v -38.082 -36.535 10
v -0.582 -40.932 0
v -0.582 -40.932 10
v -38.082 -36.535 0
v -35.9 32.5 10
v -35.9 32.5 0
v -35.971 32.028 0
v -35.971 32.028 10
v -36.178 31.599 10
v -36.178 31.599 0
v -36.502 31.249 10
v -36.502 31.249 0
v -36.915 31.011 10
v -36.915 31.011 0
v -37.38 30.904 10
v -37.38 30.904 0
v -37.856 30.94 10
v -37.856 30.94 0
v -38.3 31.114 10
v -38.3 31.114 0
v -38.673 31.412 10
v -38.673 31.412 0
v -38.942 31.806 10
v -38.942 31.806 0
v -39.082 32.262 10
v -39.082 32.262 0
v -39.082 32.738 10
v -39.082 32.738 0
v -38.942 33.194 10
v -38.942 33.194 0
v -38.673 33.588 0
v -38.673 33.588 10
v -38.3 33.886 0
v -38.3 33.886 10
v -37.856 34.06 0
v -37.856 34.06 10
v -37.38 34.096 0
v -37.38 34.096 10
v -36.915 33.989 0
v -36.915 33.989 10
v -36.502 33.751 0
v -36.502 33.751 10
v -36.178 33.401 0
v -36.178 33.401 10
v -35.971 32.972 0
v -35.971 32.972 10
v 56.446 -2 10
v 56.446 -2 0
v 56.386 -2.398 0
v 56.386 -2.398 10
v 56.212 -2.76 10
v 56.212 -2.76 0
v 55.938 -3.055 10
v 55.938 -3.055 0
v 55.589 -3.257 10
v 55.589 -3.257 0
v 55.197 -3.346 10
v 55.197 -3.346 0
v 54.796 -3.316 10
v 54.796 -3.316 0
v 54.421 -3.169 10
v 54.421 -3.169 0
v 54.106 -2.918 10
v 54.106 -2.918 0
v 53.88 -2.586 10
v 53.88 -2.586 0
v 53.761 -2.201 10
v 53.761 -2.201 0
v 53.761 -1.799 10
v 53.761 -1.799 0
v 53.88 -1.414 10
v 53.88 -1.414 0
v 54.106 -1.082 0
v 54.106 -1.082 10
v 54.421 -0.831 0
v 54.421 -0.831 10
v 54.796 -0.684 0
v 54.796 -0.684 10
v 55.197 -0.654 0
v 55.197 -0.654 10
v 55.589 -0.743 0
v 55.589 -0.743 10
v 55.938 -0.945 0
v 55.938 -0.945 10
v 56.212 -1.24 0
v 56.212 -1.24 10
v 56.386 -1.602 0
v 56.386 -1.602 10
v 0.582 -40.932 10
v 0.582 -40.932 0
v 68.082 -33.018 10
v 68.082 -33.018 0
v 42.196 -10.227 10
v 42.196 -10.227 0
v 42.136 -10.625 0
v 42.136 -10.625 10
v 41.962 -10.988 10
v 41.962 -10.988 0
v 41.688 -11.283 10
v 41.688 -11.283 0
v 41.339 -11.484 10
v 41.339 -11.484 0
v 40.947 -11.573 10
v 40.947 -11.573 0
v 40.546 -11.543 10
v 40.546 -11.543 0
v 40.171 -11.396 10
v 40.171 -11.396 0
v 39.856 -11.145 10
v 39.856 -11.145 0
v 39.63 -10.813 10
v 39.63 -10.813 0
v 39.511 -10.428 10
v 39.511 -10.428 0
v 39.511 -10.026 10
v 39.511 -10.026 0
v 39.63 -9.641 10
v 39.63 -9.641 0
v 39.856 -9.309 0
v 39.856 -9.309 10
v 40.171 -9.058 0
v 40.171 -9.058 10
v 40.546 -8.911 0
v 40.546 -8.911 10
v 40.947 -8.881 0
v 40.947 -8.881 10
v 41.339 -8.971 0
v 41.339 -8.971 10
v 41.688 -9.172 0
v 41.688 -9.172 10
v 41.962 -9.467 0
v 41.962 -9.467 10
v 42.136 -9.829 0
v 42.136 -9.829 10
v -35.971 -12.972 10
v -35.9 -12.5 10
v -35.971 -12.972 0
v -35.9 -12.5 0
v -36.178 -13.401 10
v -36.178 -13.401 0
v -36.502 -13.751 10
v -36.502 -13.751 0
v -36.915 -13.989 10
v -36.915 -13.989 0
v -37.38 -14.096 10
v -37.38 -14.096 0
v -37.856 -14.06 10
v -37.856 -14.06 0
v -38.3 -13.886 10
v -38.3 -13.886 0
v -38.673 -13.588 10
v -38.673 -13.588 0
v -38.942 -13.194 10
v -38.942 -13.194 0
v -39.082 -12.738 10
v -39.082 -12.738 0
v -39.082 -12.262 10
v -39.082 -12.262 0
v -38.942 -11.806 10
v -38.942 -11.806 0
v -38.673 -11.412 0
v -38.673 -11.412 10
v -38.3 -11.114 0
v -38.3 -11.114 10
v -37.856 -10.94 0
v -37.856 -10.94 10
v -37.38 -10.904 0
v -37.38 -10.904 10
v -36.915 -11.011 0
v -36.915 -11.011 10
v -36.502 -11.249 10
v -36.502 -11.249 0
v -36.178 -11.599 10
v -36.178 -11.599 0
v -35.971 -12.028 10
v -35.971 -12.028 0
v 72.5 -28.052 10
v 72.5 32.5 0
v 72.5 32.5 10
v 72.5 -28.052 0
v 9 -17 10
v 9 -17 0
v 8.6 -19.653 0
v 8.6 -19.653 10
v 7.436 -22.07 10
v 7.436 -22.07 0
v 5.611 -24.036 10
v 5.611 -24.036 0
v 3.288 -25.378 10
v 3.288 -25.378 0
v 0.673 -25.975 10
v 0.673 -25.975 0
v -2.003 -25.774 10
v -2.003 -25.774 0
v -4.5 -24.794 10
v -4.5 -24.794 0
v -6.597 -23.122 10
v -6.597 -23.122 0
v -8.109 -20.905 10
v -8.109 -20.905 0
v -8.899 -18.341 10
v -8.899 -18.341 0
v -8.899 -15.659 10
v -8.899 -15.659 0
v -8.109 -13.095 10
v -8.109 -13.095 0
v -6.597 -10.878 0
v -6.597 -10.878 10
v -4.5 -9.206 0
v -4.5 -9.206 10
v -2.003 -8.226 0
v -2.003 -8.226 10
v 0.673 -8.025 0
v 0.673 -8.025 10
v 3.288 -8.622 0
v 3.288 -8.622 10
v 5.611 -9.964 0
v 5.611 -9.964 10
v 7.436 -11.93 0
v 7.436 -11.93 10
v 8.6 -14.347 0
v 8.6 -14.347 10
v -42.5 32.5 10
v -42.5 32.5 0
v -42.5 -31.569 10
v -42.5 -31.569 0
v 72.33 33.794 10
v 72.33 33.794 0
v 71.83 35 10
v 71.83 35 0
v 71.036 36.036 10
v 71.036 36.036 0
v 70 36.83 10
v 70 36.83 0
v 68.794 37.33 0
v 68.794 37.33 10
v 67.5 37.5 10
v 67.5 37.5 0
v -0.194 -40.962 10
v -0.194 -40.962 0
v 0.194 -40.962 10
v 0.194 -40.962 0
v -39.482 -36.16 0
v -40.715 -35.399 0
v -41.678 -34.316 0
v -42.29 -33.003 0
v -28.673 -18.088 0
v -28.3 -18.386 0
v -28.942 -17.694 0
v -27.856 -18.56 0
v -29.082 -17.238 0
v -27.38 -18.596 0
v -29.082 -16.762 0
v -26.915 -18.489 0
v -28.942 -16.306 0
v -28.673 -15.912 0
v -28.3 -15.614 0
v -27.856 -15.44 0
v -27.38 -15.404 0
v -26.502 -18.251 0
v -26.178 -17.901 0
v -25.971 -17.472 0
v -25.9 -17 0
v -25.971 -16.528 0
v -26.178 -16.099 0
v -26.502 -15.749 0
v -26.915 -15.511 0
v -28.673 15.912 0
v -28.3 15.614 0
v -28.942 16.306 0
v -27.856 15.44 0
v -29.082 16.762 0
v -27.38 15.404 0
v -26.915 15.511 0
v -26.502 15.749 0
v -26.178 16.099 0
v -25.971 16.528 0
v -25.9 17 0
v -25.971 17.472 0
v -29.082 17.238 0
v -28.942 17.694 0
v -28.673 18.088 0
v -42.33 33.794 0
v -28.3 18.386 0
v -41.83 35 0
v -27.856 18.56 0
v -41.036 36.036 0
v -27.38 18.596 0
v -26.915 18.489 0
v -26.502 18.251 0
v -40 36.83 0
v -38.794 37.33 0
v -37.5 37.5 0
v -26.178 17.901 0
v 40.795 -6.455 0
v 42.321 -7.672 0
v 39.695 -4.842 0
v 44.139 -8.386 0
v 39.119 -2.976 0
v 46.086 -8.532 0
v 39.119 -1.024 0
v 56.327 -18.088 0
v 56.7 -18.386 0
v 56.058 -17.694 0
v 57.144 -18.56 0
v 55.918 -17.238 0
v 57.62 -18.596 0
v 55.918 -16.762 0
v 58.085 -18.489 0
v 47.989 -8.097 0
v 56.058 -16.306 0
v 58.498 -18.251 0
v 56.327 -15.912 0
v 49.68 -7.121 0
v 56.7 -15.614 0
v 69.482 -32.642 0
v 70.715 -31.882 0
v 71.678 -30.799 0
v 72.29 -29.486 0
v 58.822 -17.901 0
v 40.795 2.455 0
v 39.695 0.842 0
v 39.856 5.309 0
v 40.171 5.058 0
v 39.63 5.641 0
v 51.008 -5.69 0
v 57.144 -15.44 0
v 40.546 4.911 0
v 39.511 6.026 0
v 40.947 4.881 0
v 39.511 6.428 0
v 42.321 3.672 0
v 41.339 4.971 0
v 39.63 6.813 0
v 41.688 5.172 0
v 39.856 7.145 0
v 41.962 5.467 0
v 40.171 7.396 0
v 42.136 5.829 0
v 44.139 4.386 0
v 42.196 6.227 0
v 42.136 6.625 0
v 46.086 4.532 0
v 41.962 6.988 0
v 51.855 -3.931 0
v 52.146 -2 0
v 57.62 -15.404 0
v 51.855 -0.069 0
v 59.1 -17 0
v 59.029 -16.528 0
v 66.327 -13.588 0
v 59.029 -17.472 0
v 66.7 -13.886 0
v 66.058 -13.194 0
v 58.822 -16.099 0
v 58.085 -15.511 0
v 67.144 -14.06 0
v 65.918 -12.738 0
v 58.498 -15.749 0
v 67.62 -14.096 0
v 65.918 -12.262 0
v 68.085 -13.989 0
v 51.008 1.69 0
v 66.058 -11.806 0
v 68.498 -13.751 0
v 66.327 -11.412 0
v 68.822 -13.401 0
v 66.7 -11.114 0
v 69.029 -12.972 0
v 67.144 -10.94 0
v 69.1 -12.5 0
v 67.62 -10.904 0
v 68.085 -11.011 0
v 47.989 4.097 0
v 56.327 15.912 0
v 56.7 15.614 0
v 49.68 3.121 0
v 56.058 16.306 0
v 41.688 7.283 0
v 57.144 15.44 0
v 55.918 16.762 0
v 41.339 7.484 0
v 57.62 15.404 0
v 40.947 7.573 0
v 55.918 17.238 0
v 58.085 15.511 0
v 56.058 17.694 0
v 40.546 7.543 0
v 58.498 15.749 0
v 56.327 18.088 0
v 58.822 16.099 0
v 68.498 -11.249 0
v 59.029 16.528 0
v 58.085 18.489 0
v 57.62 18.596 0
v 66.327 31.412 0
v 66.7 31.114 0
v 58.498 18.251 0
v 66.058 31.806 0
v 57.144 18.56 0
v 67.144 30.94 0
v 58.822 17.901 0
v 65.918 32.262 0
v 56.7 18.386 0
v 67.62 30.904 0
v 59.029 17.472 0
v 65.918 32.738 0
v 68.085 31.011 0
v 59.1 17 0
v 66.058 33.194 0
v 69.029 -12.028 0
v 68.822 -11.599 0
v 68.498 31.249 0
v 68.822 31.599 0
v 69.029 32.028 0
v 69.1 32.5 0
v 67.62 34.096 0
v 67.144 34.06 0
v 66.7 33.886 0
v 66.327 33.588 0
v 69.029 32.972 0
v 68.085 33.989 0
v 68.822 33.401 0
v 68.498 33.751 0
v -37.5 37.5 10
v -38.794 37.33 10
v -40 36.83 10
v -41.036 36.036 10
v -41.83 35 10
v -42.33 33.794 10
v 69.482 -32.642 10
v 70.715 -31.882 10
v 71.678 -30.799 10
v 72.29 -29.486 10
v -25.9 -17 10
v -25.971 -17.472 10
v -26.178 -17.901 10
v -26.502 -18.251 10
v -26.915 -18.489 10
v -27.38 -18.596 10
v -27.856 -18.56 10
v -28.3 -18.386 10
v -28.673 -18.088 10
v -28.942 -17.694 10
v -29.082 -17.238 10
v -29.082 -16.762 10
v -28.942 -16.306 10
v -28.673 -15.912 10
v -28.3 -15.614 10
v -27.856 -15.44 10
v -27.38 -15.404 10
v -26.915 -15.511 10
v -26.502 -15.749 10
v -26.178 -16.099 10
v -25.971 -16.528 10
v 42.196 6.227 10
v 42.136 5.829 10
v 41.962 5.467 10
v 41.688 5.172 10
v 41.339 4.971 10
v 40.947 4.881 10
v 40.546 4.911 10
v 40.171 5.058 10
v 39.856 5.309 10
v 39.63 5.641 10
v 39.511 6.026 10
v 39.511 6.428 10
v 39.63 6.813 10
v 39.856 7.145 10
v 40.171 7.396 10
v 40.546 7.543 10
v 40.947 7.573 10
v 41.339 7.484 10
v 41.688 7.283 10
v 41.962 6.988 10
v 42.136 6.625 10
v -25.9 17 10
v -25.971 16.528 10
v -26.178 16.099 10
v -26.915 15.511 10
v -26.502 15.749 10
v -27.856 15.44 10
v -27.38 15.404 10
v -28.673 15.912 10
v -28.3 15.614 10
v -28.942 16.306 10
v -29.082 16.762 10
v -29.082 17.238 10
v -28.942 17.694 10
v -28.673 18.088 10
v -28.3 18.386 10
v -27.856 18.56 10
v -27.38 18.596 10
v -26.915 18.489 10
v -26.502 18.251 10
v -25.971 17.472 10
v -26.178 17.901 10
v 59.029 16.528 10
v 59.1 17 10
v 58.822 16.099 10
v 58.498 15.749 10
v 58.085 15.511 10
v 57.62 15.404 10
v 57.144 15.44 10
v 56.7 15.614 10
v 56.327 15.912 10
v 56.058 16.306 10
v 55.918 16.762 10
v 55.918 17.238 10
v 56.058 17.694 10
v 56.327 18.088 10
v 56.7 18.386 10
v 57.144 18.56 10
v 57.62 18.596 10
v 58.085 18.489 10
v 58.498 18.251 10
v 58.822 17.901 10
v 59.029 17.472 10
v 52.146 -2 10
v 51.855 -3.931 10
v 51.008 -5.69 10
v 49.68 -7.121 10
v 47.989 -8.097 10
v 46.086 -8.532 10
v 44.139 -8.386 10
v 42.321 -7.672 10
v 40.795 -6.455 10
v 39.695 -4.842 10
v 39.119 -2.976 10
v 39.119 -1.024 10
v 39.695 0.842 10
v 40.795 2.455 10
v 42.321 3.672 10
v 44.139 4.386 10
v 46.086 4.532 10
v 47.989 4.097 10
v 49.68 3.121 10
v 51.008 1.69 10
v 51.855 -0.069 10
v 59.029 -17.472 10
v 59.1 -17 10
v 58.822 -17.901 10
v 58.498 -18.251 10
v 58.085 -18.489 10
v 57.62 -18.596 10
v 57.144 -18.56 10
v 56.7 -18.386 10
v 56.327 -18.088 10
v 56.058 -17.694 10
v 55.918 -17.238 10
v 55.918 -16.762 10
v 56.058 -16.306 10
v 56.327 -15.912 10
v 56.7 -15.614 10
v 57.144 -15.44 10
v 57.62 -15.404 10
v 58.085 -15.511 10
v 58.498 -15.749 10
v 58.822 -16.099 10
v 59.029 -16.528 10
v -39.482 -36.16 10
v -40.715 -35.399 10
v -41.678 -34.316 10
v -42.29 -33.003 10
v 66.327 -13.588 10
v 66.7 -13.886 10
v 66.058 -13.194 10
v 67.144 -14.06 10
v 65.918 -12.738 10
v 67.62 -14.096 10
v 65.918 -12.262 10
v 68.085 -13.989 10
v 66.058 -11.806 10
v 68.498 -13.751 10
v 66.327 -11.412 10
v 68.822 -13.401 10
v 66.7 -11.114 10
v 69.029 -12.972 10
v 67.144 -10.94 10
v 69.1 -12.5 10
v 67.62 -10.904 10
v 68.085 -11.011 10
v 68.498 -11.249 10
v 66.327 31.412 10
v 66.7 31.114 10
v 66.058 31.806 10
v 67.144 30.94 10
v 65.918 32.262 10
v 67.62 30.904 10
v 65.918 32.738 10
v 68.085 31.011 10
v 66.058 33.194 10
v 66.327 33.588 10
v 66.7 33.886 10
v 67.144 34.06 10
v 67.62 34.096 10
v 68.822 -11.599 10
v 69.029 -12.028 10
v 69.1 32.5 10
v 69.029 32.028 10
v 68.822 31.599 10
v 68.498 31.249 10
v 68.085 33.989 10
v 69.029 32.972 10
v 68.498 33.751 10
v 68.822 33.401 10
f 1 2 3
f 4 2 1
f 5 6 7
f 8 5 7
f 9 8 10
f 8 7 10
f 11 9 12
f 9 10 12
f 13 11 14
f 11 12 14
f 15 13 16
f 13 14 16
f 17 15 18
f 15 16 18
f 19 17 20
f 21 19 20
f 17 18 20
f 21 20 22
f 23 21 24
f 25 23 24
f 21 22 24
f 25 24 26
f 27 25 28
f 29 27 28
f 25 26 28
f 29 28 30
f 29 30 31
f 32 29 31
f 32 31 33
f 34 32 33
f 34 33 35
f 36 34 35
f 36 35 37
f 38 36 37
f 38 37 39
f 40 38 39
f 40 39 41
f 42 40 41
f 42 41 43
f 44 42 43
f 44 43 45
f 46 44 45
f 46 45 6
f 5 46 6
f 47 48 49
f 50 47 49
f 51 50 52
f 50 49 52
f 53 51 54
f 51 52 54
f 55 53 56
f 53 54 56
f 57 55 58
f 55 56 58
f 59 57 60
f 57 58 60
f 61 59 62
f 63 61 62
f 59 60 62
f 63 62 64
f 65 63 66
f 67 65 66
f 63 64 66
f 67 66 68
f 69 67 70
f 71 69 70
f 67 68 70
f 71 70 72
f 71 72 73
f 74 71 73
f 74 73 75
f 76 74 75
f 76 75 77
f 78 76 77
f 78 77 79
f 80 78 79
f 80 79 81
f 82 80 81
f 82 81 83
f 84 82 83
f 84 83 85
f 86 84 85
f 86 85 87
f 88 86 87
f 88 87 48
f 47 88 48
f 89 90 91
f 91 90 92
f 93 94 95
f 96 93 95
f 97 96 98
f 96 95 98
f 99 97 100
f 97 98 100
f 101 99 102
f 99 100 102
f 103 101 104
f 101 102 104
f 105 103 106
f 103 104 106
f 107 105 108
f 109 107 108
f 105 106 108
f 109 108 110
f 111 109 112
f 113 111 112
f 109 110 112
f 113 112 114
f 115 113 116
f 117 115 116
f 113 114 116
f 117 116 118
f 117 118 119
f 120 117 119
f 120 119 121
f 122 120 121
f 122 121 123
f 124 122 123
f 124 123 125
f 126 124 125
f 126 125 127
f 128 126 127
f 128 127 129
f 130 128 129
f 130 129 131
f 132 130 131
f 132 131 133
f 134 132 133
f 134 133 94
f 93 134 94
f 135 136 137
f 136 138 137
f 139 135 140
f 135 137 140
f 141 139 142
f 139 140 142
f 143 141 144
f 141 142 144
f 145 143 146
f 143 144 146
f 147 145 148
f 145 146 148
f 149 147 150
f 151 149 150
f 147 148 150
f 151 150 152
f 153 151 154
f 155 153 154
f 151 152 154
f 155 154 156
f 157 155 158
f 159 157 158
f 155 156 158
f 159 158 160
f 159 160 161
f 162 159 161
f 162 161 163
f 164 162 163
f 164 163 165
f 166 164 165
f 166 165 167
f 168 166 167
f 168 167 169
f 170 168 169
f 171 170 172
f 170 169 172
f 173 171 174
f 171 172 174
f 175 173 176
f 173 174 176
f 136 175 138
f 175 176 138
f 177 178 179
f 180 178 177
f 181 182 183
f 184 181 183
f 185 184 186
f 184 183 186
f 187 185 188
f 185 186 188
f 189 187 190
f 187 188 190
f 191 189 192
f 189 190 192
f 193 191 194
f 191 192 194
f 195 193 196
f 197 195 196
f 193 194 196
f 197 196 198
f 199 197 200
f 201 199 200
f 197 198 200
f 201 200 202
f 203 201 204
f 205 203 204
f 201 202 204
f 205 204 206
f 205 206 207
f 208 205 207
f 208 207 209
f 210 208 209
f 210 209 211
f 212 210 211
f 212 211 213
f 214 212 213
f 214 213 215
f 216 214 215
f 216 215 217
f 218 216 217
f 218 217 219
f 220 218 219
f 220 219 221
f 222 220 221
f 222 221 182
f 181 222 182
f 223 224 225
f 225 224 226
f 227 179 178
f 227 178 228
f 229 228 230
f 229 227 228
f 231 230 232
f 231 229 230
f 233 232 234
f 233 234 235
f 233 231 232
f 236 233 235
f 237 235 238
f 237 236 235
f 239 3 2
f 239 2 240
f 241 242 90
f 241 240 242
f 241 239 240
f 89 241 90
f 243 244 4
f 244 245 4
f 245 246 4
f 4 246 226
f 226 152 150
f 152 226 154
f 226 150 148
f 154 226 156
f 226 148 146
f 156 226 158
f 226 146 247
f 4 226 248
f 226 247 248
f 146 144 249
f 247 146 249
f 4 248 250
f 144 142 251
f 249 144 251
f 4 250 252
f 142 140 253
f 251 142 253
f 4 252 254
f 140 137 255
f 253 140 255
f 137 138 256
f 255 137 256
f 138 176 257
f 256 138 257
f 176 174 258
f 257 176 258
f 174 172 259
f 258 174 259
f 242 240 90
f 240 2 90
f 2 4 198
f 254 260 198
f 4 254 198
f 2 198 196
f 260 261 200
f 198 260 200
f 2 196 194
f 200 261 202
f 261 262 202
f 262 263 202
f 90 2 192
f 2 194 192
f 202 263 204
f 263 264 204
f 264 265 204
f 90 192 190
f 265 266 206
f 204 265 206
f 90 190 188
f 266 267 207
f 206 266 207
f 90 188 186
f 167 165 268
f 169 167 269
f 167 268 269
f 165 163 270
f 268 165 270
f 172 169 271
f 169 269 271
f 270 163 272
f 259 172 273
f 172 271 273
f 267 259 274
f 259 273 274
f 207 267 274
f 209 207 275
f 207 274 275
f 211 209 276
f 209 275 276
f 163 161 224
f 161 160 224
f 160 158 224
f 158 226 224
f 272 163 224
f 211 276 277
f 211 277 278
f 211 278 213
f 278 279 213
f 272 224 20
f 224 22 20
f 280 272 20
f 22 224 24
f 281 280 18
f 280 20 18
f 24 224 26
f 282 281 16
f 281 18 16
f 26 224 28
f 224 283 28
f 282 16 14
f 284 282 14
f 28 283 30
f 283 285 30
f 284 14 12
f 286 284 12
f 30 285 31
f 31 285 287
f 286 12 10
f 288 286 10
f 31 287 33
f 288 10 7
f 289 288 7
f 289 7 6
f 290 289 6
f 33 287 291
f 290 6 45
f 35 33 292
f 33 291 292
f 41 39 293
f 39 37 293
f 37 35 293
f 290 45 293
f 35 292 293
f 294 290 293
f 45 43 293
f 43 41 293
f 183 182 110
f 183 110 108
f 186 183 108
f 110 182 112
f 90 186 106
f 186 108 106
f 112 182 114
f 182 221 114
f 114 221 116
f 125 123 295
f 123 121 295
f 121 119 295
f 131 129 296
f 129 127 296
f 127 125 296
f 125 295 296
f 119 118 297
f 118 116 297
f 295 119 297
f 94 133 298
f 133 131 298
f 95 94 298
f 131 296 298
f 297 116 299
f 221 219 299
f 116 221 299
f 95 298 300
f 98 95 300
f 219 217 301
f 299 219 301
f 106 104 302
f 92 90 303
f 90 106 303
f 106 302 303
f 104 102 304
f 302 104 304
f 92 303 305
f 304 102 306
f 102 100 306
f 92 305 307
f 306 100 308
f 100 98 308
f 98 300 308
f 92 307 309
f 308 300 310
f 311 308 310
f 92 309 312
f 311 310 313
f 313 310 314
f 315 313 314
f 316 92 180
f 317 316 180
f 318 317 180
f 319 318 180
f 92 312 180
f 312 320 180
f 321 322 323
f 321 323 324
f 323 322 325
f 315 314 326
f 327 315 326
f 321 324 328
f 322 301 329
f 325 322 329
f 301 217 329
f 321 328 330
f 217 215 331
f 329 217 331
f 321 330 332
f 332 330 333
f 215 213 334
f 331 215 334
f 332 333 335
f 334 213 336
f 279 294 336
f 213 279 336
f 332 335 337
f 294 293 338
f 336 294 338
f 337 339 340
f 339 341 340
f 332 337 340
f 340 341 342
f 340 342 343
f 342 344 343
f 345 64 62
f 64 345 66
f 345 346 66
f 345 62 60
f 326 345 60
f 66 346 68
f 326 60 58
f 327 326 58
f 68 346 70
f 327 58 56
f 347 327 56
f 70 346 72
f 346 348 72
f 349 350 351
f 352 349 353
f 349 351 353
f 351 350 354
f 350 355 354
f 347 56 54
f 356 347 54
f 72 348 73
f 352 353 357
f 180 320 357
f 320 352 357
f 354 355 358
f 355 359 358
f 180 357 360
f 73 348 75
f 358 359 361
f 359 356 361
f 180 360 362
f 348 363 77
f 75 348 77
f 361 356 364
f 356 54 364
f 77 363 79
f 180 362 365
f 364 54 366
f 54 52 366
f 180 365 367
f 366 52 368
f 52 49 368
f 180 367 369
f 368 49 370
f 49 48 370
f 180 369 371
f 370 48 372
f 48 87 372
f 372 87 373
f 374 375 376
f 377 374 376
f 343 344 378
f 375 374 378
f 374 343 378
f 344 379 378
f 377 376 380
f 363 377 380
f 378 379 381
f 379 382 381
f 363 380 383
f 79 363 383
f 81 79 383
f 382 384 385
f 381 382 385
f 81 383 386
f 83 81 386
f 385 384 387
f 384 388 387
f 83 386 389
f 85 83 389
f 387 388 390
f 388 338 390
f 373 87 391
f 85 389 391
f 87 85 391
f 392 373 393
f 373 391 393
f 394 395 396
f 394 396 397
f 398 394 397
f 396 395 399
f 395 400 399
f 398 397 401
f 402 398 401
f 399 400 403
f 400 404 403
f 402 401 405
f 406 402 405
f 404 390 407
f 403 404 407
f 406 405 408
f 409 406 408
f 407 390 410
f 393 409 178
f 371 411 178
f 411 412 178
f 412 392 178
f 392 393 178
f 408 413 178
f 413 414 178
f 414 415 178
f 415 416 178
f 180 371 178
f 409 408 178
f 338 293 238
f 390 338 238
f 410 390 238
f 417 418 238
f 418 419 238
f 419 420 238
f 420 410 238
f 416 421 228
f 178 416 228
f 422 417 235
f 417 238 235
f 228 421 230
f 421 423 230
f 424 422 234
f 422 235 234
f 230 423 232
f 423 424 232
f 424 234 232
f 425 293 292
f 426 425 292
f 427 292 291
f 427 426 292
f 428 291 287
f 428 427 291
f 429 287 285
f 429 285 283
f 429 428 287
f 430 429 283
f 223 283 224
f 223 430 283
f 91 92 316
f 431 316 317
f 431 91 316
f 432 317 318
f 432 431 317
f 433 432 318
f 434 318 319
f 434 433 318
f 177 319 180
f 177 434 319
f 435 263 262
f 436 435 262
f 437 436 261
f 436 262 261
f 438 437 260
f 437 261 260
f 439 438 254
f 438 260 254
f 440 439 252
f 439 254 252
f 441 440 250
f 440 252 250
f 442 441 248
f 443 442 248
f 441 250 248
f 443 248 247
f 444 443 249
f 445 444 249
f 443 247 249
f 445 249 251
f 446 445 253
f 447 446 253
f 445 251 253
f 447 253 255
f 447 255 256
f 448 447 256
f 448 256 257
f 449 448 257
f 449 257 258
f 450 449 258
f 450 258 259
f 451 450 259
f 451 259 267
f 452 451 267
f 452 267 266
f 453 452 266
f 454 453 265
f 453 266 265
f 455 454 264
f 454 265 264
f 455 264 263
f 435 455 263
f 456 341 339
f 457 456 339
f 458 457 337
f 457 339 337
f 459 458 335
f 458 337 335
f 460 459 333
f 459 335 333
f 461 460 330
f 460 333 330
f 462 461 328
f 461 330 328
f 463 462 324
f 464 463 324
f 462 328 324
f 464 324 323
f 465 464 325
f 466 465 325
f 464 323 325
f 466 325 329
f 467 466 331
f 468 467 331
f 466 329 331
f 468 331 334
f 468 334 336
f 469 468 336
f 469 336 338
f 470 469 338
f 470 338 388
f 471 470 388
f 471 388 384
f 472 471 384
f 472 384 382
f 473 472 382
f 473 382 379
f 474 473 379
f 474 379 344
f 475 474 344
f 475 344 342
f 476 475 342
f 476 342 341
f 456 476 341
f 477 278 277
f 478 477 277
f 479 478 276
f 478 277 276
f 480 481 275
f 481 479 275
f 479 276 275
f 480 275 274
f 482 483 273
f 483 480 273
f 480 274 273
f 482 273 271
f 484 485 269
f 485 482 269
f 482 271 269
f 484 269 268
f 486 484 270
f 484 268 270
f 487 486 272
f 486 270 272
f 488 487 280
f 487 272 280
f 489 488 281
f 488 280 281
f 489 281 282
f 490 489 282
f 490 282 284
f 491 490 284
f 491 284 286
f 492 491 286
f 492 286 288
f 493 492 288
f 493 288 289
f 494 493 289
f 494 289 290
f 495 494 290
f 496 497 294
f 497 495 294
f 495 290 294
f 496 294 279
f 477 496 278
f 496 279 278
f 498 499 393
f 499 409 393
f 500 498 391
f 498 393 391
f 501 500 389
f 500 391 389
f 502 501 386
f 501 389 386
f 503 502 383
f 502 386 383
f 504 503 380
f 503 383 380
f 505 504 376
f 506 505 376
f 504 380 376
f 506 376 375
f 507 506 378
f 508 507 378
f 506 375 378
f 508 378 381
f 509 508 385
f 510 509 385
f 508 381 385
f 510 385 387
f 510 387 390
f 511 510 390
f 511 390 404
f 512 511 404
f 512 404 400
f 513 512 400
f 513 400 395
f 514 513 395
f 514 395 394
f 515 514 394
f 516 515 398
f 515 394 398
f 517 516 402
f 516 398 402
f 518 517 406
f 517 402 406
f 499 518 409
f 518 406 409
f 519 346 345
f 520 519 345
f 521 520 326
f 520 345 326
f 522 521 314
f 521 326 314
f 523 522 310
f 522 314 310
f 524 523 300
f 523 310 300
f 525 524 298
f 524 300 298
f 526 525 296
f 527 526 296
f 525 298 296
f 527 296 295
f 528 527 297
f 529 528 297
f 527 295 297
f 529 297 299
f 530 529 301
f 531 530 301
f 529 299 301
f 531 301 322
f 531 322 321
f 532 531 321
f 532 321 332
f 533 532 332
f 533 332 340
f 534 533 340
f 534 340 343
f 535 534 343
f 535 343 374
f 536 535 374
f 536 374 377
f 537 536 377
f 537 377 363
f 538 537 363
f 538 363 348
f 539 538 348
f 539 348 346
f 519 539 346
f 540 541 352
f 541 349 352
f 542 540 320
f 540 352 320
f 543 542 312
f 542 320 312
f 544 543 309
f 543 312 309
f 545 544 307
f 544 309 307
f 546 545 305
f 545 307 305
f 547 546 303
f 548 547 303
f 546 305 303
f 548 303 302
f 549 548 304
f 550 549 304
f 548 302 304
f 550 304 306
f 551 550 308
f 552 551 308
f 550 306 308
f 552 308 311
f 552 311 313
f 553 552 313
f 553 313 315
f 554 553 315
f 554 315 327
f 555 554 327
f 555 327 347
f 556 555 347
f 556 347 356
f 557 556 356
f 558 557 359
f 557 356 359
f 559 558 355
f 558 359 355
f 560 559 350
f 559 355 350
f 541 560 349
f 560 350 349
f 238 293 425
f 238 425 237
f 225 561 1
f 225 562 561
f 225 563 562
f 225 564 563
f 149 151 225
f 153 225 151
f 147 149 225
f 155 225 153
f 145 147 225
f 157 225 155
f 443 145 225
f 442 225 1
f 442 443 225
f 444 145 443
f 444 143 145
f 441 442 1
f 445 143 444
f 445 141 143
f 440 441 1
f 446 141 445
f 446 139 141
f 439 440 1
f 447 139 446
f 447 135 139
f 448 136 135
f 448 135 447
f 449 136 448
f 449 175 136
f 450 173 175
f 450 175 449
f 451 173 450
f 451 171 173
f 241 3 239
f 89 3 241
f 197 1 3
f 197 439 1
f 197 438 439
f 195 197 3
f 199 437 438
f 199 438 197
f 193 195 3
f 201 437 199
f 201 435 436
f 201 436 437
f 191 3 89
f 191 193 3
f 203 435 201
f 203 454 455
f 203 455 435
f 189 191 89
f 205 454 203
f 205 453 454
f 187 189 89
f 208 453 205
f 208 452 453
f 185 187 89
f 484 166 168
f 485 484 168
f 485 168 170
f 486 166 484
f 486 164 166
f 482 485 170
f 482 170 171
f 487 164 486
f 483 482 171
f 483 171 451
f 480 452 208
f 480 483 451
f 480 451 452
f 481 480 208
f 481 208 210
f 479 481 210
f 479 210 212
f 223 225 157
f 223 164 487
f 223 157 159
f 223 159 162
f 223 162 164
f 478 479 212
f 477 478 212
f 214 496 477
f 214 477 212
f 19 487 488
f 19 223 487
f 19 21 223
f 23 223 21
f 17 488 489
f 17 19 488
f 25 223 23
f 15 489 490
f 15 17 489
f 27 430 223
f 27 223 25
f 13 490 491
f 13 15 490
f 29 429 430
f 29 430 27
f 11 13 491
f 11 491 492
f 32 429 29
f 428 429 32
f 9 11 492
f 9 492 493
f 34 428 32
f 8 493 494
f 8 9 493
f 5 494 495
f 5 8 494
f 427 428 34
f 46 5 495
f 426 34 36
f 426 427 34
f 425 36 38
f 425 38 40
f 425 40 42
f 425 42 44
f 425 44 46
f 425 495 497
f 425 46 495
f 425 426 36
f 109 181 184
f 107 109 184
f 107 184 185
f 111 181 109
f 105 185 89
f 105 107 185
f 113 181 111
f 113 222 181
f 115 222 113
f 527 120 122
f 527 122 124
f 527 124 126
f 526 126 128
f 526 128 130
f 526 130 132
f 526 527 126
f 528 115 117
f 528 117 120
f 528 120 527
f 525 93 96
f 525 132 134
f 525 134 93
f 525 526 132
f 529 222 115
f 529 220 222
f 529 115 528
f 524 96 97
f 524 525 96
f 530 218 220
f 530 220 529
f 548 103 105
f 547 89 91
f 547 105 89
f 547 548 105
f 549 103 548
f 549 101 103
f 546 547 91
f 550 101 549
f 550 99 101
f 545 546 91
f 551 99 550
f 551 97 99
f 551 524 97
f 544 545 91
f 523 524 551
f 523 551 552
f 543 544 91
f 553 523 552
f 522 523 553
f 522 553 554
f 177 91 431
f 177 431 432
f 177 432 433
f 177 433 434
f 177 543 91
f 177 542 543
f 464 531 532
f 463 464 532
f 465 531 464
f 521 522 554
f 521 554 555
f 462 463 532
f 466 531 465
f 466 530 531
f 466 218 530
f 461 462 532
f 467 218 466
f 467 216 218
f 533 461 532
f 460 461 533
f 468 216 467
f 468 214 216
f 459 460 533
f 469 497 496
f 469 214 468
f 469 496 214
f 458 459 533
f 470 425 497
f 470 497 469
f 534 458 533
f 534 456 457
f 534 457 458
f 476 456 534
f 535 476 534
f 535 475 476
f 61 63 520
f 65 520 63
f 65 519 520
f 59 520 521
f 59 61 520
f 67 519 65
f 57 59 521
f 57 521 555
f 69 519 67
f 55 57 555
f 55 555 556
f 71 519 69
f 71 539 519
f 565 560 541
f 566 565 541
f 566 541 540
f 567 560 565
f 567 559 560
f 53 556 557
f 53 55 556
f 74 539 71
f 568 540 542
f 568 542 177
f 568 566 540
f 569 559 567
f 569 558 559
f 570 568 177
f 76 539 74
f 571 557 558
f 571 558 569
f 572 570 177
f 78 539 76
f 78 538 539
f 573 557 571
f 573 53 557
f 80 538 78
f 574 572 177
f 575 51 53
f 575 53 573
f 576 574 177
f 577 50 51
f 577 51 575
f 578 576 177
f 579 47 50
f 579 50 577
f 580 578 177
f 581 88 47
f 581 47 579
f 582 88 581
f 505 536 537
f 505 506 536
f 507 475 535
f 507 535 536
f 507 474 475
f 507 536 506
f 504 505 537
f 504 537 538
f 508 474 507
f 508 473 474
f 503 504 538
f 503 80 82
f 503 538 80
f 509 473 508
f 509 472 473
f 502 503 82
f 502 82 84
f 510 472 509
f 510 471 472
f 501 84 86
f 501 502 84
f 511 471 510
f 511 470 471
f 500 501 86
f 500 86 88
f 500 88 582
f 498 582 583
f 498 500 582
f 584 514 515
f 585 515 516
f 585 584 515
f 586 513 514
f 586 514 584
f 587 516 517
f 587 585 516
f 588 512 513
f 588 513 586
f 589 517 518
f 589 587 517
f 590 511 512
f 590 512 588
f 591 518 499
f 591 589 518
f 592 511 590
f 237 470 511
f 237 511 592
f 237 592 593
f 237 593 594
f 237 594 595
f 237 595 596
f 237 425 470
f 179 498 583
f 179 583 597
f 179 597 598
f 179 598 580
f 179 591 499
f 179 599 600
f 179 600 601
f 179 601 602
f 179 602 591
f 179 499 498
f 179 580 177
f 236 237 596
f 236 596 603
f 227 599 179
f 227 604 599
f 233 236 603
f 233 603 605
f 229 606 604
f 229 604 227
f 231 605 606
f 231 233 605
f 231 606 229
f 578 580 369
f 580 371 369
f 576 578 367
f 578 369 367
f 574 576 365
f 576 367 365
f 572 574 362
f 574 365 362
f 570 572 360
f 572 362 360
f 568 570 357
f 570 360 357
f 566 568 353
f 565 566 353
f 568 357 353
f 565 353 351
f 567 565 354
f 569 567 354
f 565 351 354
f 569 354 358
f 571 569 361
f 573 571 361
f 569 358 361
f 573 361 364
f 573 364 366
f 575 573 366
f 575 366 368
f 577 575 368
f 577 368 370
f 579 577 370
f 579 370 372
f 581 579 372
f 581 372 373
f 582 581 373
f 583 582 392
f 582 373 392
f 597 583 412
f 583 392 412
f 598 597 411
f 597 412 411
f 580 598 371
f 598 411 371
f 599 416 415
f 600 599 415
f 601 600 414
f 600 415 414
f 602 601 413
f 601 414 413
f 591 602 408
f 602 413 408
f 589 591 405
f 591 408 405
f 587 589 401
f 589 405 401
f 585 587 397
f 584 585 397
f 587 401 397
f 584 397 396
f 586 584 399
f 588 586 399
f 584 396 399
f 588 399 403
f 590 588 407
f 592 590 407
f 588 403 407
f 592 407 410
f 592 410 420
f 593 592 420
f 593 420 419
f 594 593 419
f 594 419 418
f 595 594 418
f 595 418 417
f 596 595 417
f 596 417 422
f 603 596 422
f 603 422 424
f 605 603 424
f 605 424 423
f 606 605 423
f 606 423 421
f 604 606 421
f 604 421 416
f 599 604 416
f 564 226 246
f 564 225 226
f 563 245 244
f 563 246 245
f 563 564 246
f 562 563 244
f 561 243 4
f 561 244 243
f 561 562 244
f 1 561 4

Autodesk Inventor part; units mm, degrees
ref_plane "YZ Plane" through (0, 0, 0) normal (1, 0, 0) x (0, 1, 0)
ref_plane "XZ Plane" through (0, 0, 0) normal (0, 1, 0) x (-1, 0, 0)
ref_plane "XY Plane" through (0, 0, 0) normal (0, 0, 1) x (1, 0, 0)
sketch "スケッチ1" plane through (0, 0, 0) normal (0, 0, 1) x (1, 0, 0)
  point P0 (0, 0)
sketch "スケッチ2" plane through (0, 0, 0) normal (0, 0, 1) x (1, 0, 0)
  line L0 (72.5, -37.5) -> (-72.5, -37.5)
  line L1 (-72.5, -37.5) -> (-72.5, 37.5)
  line L2 (-72.5, 37.5) -> (72.5, 37.5)
  line L3 (72.5, 37.5) -> (72.5, -37.5)
  line L4 (72.5, -37.5) -> (-72.5, 37.5) construction
  line L5 (-72.5, -37.5) -> (72.5, 37.5) construction
  circle A0 centre (-48, -17) radius 6.05
  circle A1 centre (-48, -17) radius 9
  circle A2 centre (-57, -17) radius 1.6
  circle A3 centre (-48, -26) radius 1.6
  circle A4 centre (-39, -17) radius 1.6
  circle A5 centre (-48, -8) radius 1.6
  line L6 (67.5, 32.5) -> (-67.5, 32.5)
  line L7 (-67.5, 32.5) -> (-67.5, -32.5)
  line L8 (-67.5, -32.5) -> (67.5, -32.5)
  line L9 (67.5, -32.5) -> (67.5, 32.5)
  line L10 (-67.5, 32.5) -> (-67.5, 12.5) construction
  line L11 (-69.1, 32.5) -> (-69.1, 12.5)
  line L12 (-65.9, 12.5) -> (-65.9, 32.5)
  arc A6 (-65.9, 32.5) -> (-69.1, 32.5) centre (-67.5, 32.5) ccw
  arc A7 (-69.1, 12.5) -> (-65.9, 12.5) centre (-67.5, 12.5) ccw
  line L13 (-67.5, 32.5) -> (-47.5, 32.5) construction
  line L14 (-67.5, -32.5) -> (-67.5, -12.5) construction
  line L15 (-65.9, -32.5) -> (-65.9, -12.5)
  line L16 (-69.1, -12.5) -> (-69.1, -32.5)
  arc A8 (-69.1, -32.5) -> (-65.9, -32.5) centre (-67.5, -32.5) ccw
  arc A9 (-65.9, -12.5) -> (-69.1, -12.5) centre (-67.5, -12.5) ccw
  line L17 (-67.5, -32.5) -> (-47.5, -32.5) construction
  line L18 (67.5, 32.5) -> (105, 32.5) construction
  line L19 (-72.5, -17) -> (72.5, -17)
  circle A10 centre (0, -17) radius 9
  circle A11 centre (0, -17) radius 39
  line L20 (-65, 37.5) -> (65, 37.5)
  line L21 (65, 37.5) -> (65, 32.5)
  line L22 (65, 32.5) -> (-65, 32.5)
  line L23 (-65, 32.5) -> (-65, 37.5)
  line L24 (-65, 32.5) -> (0, 0)
  line L25 (0, 0) -> (65, 32.5)
  line L26 (-72.5, 0) -> (72.5, 0)
  line L27 (72.5, 0) -> (72.5, -47.5)
  line L28 (72.5, -47.5) -> (-72.5, -47.5)
  line L29 (-72.5, -47.5) -> (-72.5, 0)
  circle A12 centre (-67.5, 32.5) radius 1.6
  circle A13 centre (-67.5, -12.5) radius 1.6
  line L30 (0, 37.5) -> (0, -47.5)
  line L31 (67.5, 32.5) -> (67.5, 12.5) construction
  line L32 (69.1, 32.5) -> (69.1, 12.5)
  line L33 (65.9, 12.5) -> (65.9, 32.5)
  arc A14 (69.1, 32.5) -> (65.9, 32.5) centre (67.5, 32.5) ccw
  arc A15 (65.9, 12.5) -> (69.1, 12.5) centre (67.5, 12.5) ccw
  line L34 (67.5, -32.5) -> (67.5, -12.5) construction
  line L35 (65.9, -32.5) -> (65.9, -12.5)
  line L36 (69.1, -12.5) -> (69.1, -32.5)
  arc A16 (65.9, -32.5) -> (69.1, -32.5) centre (67.5, -32.5) ccw
  arc A17 (69.1, -12.5) -> (65.9, -12.5) centre (67.5, -12.5) ccw
  circle A18 centre (67.5, 32.5) radius 1.6
  circle A19 centre (67.5, -12.5) radius 1.6
  circle A20 centre (-57.5, -17) radius 1.6
  circle A21 centre (-57.5, 17) radius 1.6
  circle A22 centre (57.5, -17) radius 1.6
  circle A23 centre (57.5, 17) radius 1.6
  circle A24 centre (45.5961, -2) radius 6.55
  circle A25 centre (45.5961, -2) radius 9.5
  circle A26 centre (55.0961, -2) radius 1.35
  circle A27 centre (40.8461, 6.2272) radius 1.35
  circle A28 centre (40.8461, -10.2272) radius 1.35
  circle A29 centre (45.5961, -2) radius 24
  circle A30 centre (0, -17) radius 24
  line L37 (69.5961, -2) -> (21.5961, -2)
  line L38 (0, -41) -> (-72.5, -32.5)
  line L39 (0, -41) -> (72.5, -32.5)
  circle A31 centre (-37.5, -12.5) radius 1.6
  circle A32 centre (-27.5, -17) radius 1.6
  circle A33 centre (-37.5, 32.5) radius 1.6
  circle A34 centre (-27.5, 17) radius 1.6
  line L40 (-42.5, 37.5) -> (-42.5, -47.5)
  circle A35 centre (45.5961, -2) radius 12.2
  point P0 (-67.5, 22.5)
  point P1 (-67.5, -22.5)
  point P2 (-39.1422, -18.5937)
  point P3 (-39.1422, -15.4063)
  point P4 (65, 37.5)
  point P5 (67.5, 22.5)
  point P6 (67.5, -22.5)
  point P7 (-65.9, -12.5)
  point P8 (-69.1, 32.5)
  point P9 (-65, 32.5)
  point P10 (36, -2)
  point P11 (38.741, -15.0124)
  point P12 (33.8387, -0.1107)
  point P13 (63.5912, 34.2414)
  point P14 (65, 36.6)
  point P15 (-65, 36.6)
  point P16 (-63.5912, 34.2414)
  point P17 (-5.5513, -40.3492)
  point P18 (5.5513, -40.3492)
  point P19 (72.5, -32.5)
  point P20 (25.3223, 12.6611)
  point P21 (-25.3223, 12.6611)
  point P22 (-72.5, -32.5)
  point P23 (-42.5, 37.5)
  point P24 (-42.5, -36.0172)
  dimension "d15" = 18
  dimension "d56" = 19
  dimension "d60" = 48
  dimension "d0" = 145
  dimension "d1" = 75
  dimension "d5" = 12.1
  dimension "d16" = 3.2
  dimension "d19" = 360
  dimension "d21" = 5
  dimension "d22" = 20
  dimension "d23" = 90
  dimension "d24" = 3.2
  dimension "d25" = 20
  dimension "d26" = 90
  dimension "d27" = 3.2
  dimension "d36" = 20.5
  dimension "d37" = 18
  dimension "d38" = 78
  dimension "d40" = 48
  dimension "d43" = 130
  dimension "d44" = 65
  dimension "d46" = 47.5
  dimension "d47" = 3.2
  dimension "d48" = 3.2
  dimension "d49" = 10
  dimension "d50" = 10
  dimension "d51" = 17
  dimension "d52" = 17
  dimension "d55" = 13.1
  dimension "d57" = 2.7
  dimension "d58" = 360
  dimension "d59" = 48
  dimension "d62" = 15
  dimension "d65" = 30
  dimension "d70" = 30
  dimension "d71" = 24.4
extrude "押し出し1" add sketch "スケッチ2" along normal blind 10 contours L39 A16 L36 L19 L3 | L39 A30 L0 | L0 A30 L8 A11 L39 | A11 L8 A16 L39 | L19 L36 A17 A29 L26 L3 | L39 A16 L8 L9 L19 L36 | A30 L39 L30 L0 | L0 L30 L8 A30 | A11 A29 L19 L35 L8 | L8 A30 L19 A29 A11 | L26 A29 L9 A15 L32 A14 L6 L21 L2 L3 | L19 L9 A19 L36 | L30 L38 A30 L0 | L0 A30 L8 L30 | L8 L30 A10 L19 A30 | L35 L19 L9 L8 | A29 L19 A11 | A11 L19 A22 A29 | A29 L37 L9 L26 | L26 L9 A29 | L19 L35 A29 A19 L9 | A30 L38 L0 | L0 L38 A11 L8 A30 | L8 A30 L19 A10 L30 | A30 A29 L19 | L19 A10 L30 L26 A30 | L38 L40 L8 A11 | L19 A29 L35 | A11 A35 L37 L9 A17 L35 A29 L19 A22 | L19 A29 L37 A35 A11 | L21 L6 L30 L2 | L26 A35 A11 A29 L25 A23 L9 | L9 L37 A35 L26 | A29 A17 L9 L37 | A29 A23 L25 L6 L33 A15 L9 | L8 A11 A4 L19 A32 A30 | A30 L26 A29 | L8 L40 A1 A4 A11 | L35 A19 A29 | A35 L37 A11 A25 | A11 A25 A28 A26 L37 A35 | L30 L6 A33 L40 L2 | L25 A29 A11 L30 L6 | A35 L37 A26 A25 L26 | L26 A25 A27 A11 A35 | A15 L33 A18 L9 | L9 A18 L32 A15 | A30 L26 L30 A10 L19 | L19 A32 A4 A11 A31 L26 A30 | A29 L26 A35 L37 | A30 L25 A11 A29 L26 | L26 L25 A30 | A11 L19 A4 | A4 A1 A11 | A25 A11 | A11 A25 L37 A24 A26 A28 | A35 L26 A11 L37 | L30 A11 L24 L40 L6 A33 | L25 A29 | A25 A26 L37 A24 L26 | L26 A24 A25 A27 | A35 L26 A29 A11 | A11 L26 A35 | A30 L24 L26 | L26 A11 L24 A30 | L30 A30 L25 | L24 A30 L30 | A30 L30 A11 L25 | L40 A0 L19 A4 A1 | A4 L19 A1 | L19 A11 A4 | L19 A4 A1 | A1 A4 A11 | A11 L37 A25 | A11 L26 A25 L37 | L30 A30 L24 A11 | A29 A11 L25 | L26 L40 L24 A11 | A11 A31 A4 A1 L40 L26 | L40 L19 A0 | L19 A0 L40 A1 A4 | A25 L26 A24 L37 | L19 L40 A0 picked at (-42.3988, -18.41) picked at (-42.3988, -15.59)
fillet "フィレット1" radius 5 5 edges at (72.5, 37.5, 5) (72.5, -32.5, 5) (0, -41, 5) (-42.5, 37.5, 5) (-42.5, -36.0172, 5)
equation "\"d25\" = d22"
equation "\"d27\" = d24"
equation "\"d40\" = d39"
equation "\"d44\" = 0.5 * d43"
equation "\"d39\" = 48"
properties part number "small_plate_motor"
